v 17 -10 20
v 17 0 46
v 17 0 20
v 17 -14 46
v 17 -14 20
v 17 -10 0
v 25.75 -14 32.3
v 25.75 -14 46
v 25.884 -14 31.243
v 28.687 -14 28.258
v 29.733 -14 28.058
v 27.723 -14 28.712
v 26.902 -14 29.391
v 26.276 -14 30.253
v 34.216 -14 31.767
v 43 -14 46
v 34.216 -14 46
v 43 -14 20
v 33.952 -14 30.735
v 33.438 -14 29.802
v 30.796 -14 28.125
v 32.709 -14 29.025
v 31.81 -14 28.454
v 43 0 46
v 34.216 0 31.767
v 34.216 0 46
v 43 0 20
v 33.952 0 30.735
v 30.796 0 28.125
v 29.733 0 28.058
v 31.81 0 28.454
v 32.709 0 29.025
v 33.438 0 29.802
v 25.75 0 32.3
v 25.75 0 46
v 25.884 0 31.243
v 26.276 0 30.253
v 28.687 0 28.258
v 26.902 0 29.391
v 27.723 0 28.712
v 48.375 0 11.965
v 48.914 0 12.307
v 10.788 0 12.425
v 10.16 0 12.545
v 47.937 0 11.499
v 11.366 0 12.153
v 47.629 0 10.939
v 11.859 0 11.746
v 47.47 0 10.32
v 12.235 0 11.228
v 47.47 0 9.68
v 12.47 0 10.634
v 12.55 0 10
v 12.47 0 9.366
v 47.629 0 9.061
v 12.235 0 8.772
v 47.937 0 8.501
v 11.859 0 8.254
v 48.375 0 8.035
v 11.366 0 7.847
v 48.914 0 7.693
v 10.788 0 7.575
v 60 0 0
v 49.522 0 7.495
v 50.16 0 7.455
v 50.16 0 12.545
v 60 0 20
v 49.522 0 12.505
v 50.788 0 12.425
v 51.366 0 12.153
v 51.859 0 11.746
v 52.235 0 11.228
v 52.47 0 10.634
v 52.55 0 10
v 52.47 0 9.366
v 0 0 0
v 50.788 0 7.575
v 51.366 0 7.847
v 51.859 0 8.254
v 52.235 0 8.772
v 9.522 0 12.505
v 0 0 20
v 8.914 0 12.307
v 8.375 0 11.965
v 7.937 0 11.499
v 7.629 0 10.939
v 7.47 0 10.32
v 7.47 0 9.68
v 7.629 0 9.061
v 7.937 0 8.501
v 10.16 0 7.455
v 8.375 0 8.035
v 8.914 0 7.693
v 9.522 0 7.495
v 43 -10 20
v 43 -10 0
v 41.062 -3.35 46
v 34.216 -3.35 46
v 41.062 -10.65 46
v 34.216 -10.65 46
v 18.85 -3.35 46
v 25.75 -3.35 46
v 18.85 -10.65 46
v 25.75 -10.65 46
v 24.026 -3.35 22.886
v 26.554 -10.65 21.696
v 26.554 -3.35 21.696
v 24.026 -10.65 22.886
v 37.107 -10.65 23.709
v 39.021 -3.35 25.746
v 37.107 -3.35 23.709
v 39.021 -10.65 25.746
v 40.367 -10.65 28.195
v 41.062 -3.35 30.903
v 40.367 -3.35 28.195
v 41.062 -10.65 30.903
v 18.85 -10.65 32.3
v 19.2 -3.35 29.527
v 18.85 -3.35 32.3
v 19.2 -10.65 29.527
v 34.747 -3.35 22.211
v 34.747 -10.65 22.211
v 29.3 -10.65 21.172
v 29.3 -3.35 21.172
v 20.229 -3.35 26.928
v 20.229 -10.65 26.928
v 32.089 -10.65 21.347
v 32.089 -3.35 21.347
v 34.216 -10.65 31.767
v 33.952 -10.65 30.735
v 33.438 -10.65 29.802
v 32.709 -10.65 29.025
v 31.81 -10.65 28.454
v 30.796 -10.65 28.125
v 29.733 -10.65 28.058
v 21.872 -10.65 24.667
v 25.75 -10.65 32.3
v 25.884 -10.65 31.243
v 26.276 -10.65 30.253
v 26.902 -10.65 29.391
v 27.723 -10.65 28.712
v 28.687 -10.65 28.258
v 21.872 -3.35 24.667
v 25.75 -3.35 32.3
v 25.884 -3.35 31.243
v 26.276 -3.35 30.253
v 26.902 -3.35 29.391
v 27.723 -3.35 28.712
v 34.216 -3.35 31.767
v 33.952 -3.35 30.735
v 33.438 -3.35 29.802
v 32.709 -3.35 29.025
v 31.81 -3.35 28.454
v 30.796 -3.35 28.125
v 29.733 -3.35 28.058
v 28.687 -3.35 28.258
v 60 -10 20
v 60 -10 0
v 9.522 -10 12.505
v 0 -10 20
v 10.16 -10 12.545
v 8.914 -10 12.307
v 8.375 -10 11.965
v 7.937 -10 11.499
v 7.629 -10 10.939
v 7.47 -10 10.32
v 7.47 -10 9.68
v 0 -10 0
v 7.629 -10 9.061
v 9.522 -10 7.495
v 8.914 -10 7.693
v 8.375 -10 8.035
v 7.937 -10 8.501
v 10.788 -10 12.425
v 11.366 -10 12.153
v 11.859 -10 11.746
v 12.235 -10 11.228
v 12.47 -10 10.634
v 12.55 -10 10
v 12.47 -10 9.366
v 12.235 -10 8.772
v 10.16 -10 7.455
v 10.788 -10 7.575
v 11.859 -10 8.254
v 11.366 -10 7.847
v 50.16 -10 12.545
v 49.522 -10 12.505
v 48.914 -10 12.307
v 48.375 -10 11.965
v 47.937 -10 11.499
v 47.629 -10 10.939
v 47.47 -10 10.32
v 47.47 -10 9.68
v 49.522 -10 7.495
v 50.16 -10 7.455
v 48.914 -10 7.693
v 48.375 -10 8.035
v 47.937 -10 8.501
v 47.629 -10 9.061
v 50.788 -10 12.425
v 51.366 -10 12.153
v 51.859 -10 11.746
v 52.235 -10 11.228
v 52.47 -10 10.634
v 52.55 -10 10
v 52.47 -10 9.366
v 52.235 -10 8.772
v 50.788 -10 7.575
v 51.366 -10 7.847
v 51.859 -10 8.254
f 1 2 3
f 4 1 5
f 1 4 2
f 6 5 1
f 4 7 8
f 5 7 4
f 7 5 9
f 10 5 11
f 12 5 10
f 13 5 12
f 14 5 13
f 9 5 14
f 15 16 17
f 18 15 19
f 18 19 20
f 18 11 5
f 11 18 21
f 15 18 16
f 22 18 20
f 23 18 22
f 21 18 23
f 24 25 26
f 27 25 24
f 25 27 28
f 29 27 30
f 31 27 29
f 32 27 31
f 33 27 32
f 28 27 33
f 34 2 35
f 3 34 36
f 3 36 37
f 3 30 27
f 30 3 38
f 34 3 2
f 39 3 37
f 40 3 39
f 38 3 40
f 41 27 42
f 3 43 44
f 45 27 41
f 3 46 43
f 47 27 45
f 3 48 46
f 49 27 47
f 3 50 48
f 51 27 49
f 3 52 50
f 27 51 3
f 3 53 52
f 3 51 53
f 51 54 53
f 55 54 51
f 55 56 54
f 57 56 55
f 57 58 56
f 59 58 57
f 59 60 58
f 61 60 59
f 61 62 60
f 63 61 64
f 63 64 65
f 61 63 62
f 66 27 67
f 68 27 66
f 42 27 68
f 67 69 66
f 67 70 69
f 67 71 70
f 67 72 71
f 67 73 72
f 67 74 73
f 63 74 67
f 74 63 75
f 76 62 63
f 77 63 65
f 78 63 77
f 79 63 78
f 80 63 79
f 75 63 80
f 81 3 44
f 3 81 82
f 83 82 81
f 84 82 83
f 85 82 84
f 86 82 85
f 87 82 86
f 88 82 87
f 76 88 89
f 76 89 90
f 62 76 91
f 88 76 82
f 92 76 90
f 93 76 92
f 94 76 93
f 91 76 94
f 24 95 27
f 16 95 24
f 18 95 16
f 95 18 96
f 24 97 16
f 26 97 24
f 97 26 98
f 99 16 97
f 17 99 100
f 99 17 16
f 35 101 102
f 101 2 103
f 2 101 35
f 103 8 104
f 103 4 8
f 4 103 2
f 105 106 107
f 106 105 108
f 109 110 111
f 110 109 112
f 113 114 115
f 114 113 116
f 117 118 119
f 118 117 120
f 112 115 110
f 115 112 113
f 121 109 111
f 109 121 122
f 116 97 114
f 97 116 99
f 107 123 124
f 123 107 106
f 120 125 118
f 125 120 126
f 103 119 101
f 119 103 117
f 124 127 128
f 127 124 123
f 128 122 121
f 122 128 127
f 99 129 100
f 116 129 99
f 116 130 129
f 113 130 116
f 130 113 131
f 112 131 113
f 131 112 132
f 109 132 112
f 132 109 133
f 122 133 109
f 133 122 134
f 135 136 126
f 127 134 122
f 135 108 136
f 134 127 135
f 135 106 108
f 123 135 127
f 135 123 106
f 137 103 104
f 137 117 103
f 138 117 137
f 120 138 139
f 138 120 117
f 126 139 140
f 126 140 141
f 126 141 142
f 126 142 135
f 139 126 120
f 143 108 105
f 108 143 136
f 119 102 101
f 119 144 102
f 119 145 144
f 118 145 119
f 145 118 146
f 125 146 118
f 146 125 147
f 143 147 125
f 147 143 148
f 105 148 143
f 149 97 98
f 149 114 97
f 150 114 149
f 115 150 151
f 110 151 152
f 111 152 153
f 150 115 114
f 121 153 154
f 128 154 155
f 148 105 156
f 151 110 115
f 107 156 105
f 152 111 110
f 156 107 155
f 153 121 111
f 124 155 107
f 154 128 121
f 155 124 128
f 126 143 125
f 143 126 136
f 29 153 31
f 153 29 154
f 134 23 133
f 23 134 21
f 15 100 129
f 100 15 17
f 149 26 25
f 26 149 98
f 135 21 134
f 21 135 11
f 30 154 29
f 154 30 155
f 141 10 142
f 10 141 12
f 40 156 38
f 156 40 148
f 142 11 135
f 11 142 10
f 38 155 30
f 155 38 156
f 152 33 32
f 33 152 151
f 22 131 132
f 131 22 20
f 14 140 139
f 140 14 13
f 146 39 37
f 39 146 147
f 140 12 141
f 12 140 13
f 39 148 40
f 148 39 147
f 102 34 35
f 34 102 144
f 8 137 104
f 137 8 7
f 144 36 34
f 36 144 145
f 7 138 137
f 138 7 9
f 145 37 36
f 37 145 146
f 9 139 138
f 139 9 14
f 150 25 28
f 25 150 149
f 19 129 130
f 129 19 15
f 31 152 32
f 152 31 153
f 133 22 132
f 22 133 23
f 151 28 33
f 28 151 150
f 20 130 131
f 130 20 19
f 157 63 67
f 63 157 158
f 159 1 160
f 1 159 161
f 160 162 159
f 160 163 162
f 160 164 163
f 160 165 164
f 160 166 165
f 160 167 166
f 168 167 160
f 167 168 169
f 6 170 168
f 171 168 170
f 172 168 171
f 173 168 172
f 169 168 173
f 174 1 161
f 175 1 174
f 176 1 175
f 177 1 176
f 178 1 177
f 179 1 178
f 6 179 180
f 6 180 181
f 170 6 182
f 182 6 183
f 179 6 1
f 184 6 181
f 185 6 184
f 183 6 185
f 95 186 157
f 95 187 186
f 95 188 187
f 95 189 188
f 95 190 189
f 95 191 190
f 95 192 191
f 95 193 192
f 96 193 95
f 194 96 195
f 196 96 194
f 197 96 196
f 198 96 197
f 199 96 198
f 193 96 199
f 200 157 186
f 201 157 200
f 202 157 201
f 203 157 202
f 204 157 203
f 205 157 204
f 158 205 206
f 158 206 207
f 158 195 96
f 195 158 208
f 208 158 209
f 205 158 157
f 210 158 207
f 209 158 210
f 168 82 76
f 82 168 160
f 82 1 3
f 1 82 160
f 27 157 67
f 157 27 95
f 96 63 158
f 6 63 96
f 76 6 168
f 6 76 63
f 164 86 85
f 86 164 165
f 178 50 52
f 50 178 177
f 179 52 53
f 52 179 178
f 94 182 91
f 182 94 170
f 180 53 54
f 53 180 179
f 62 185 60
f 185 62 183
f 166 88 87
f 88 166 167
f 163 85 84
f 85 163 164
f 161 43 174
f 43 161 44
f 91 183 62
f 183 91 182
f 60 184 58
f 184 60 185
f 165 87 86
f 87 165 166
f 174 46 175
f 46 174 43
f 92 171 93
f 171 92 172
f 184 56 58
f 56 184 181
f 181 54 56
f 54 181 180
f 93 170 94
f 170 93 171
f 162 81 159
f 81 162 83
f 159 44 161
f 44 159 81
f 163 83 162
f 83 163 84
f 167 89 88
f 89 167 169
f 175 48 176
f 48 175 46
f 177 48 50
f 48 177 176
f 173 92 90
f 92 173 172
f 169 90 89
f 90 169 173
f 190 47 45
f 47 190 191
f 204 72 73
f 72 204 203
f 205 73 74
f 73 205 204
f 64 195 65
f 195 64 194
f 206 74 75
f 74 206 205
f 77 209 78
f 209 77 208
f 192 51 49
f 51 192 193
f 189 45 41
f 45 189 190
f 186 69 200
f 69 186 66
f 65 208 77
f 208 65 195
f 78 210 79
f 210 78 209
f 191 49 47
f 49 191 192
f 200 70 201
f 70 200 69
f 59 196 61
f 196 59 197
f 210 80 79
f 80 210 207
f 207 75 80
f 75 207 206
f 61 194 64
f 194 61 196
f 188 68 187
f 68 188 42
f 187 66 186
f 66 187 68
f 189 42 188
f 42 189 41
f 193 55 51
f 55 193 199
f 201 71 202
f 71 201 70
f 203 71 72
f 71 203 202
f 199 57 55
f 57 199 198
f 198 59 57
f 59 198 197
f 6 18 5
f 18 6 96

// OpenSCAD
bearing_diameter = 22.3;
bearing_height = 7.3;
bearing_id = 8.5;

bearing_holder_width = 26;
bearing_holder_height = 26;
bearing_holder_depth = 14;

rotate([90,0,0]) main();

module main(){
    translate([bearing_holder_width / 2 + 30, bearing_holder_height + 20, 0]) rotate([0,0,180]) holder();
    attachment();

    hull(){
        translate([30 - (bearing_holder_width / 2),20, 0]) cube([bearing_holder_width, 1, bearing_holder_depth]);
        translate([30 - (bearing_holder_width / 2), 0, 0]) cube([bearing_holder_width, 1, 10]);    
    }    
}

module attachment(){
    difference(){
        cube([60,20,10]);
        
        translate([10, 10, 0]) cylinder(d=5.1, h=10, $fn=25);
        translate([50, 10, 0]) cylinder(d=5.1, h=10, $fn=25);
    } 
}

module holder(){
    difference(){
        cube([bearing_holder_width, bearing_holder_height, bearing_holder_depth]);
        
        hull(){
            translate([bearing_diameter / 2 + (bearing_holder_width - bearing_diameter) / 2, 0, (bearing_holder_depth - bearing_height) / 2]) cylinder(d=bearing_diameter, h=bearing_height, $fn=25);
            translate([bearing_diameter / 2 + (bearing_holder_width - bearing_diameter) / 2, bearing_holder_height - bearing_height - 5, (bearing_holder_depth - bearing_height) / 2]) cylinder(d=bearing_diameter, h=bearing_height, $fn=25);
        }
        
        hull(){
            translate([bearing_diameter / 2 + (bearing_holder_width - bearing_diameter) / 2, 0, 0]) cylinder(d=bearing_id, h=bearing_holder_depth, $fn=25);
            translate([bearing_diameter / 2 + (bearing_holder_width - bearing_diameter) / 2, bearing_holder_height - bearing_height - 5, 0]) cylinder(d=bearing_id, h=bearing_holder_depth, $fn=25);            
        }
    }
}
